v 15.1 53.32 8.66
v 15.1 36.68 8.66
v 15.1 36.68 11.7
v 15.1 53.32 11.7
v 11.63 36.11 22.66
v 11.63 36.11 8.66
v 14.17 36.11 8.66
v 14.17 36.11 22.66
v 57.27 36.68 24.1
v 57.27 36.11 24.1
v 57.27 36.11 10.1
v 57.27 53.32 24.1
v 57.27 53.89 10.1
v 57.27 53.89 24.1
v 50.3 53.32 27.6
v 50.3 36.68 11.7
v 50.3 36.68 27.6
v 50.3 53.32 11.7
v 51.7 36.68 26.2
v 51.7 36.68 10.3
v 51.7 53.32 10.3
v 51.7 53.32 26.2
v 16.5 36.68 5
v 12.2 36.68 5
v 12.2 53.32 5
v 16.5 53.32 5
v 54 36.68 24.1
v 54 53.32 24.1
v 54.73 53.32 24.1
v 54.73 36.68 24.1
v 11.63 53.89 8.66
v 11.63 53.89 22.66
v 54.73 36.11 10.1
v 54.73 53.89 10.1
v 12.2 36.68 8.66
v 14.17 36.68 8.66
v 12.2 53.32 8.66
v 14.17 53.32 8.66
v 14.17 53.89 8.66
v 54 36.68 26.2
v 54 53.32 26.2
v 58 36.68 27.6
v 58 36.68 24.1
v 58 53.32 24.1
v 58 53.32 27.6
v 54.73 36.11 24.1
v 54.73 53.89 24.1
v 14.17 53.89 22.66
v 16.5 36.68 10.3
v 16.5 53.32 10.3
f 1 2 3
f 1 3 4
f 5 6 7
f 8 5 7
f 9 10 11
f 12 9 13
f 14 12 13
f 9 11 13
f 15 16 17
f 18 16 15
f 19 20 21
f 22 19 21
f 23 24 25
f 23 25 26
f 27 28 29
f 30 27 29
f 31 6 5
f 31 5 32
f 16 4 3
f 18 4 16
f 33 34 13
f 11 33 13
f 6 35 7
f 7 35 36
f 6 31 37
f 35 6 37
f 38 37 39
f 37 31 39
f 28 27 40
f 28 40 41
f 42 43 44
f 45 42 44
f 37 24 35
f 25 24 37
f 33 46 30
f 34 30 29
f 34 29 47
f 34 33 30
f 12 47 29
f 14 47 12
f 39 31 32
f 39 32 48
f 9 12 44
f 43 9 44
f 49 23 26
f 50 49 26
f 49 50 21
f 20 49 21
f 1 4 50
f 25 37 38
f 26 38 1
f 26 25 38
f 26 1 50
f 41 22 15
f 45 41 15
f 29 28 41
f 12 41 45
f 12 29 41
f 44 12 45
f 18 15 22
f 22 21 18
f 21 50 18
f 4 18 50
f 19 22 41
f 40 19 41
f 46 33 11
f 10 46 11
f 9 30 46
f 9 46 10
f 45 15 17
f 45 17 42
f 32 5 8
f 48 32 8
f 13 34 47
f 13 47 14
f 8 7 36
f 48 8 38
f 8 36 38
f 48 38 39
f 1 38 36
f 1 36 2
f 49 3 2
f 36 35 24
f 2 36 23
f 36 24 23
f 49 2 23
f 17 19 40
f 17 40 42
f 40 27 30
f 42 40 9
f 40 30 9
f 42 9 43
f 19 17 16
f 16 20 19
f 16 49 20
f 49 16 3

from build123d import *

# Parameters (mm, degrees)
MALE_START                                 = 10.1
SKETCH_1_W                                 = 2.54
SKETCH_1_H                                 = 17.78
MALE_HOUSINGS_IN_J5_DEPTH                  = 14
FEMALE_START                               = 8.66
SKETCH_2_W                                 = 2.54
SKETCH_2_H                                 = 17.78
FEMALE_HOUSINGS_ON_THE_MODULE_HEADER_DEPTH = 14
S_BEND_START                               = 5
SKETCH_3_W                                 = 4.3
SKETCH_3_H                                 = 16.64
S_BEND_ABOVE_THE_FEMALE_HOUSINGS_DEPTH     = 3.66
SKETCH_4_W                                 = 1.4
SKETCH_4_H                                 = 16.64
S_BEND_DOWN_LEG_DEPTH                      = 6.7
RUN_START                                  = 10.3
SKETCH_5_W                                 = 36.6
SKETCH_5_H                                 = 16.64
RUN_UNDER_THE_BATTERY_DEPTH                = 1.4
DROP_START                                 = 10.3
SKETCH_6_W                                 = 1.4
SKETCH_6_H                                 = 16.64
DROP_BESIDE_THE_MODULE_EDGE_DEPTH          = 17.3
RUN_START_2                                = 26.2
SKETCH_7_W                                 = 7.7
SKETCH_7_H                                 = 16.64
RUN_UNDER_THE_MALE_HOUSINGS_DEPTH          = 1.4
LOOP_START                                 = 24.1
SKETCH_8_W                                 = 4
SKETCH_8_H                                 = 16.64
LOOP_INTO_THE_MALE_HOUSINGS_DEPTH          = 3.5


with BuildPart() as part:
    # 草圖1 → male housings in J5 (new body)
    with BuildSketch(Plane.XY.offset(MALE_START)):
        with Locations((56, 45)):
            Rectangle(SKETCH_1_W, SKETCH_1_H)
    extrude(amount=MALE_HOUSINGS_IN_J5_DEPTH)



with BuildPart() as body_2:
    # 草圖2 → female housings on the module header (new body)
    with BuildSketch(Plane.XY.offset(FEMALE_START)):
        with Locations((12.9, 45)):
            Rectangle(SKETCH_2_W, SKETCH_2_H)
    extrude(amount=FEMALE_HOUSINGS_ON_THE_MODULE_HEADER_DEPTH)

    # 草圖3 → S-bend above the female housings (add)
    with BuildSketch(Plane.XY.offset(S_BEND_START)):
        with Locations((14.35, 45)):
            Rectangle(SKETCH_3_W, SKETCH_3_H)
    extrude(amount=S_BEND_ABOVE_THE_FEMALE_HOUSINGS_DEPTH)

    # 草圖4 → S-bend down leg (add)
    with BuildSketch(Plane.XY.offset(S_BEND_START)):
        with Locations((15.8, 45)):
            Rectangle(SKETCH_4_W, SKETCH_4_H)
    extrude(amount=S_BEND_DOWN_LEG_DEPTH)

    # 草圖5 → run under the battery (add)
    with BuildSketch(Plane.XY.offset(RUN_START)):
        with Locations((33.4, 45)):
            Rectangle(SKETCH_5_W, SKETCH_5_H)
    extrude(amount=RUN_UNDER_THE_BATTERY_DEPTH)

    # 草圖6 → drop beside the module edge (add)
    with BuildSketch(Plane.XY.offset(DROP_START)):
        with Locations((51, 45)):
            Rectangle(SKETCH_6_W, SKETCH_6_H)
    extrude(amount=DROP_BESIDE_THE_MODULE_EDGE_DEPTH)

    # 草圖7 → run under the male housings (add)
    with BuildSketch(Plane.XY.offset(RUN_START_2)):
        with Locations((54.15, 45)):
            Rectangle(SKETCH_7_W, SKETCH_7_H)
    extrude(amount=RUN_UNDER_THE_MALE_HOUSINGS_DEPTH)


with BuildPart() as part_1:
    add(part.part)

    add(body_2.part)  # loop into the male housings merges body 2
    # 草圖8 → loop into the male housings (add)
    with BuildSketch(Plane.XY.offset(LOOP_START)):
        with Locations((56, 45)):
            Rectangle(SKETCH_8_W, SKETCH_8_H)
    extrude(amount=LOOP_INTO_THE_MALE_HOUSINGS_DEPTH)


solid = part_1.part
